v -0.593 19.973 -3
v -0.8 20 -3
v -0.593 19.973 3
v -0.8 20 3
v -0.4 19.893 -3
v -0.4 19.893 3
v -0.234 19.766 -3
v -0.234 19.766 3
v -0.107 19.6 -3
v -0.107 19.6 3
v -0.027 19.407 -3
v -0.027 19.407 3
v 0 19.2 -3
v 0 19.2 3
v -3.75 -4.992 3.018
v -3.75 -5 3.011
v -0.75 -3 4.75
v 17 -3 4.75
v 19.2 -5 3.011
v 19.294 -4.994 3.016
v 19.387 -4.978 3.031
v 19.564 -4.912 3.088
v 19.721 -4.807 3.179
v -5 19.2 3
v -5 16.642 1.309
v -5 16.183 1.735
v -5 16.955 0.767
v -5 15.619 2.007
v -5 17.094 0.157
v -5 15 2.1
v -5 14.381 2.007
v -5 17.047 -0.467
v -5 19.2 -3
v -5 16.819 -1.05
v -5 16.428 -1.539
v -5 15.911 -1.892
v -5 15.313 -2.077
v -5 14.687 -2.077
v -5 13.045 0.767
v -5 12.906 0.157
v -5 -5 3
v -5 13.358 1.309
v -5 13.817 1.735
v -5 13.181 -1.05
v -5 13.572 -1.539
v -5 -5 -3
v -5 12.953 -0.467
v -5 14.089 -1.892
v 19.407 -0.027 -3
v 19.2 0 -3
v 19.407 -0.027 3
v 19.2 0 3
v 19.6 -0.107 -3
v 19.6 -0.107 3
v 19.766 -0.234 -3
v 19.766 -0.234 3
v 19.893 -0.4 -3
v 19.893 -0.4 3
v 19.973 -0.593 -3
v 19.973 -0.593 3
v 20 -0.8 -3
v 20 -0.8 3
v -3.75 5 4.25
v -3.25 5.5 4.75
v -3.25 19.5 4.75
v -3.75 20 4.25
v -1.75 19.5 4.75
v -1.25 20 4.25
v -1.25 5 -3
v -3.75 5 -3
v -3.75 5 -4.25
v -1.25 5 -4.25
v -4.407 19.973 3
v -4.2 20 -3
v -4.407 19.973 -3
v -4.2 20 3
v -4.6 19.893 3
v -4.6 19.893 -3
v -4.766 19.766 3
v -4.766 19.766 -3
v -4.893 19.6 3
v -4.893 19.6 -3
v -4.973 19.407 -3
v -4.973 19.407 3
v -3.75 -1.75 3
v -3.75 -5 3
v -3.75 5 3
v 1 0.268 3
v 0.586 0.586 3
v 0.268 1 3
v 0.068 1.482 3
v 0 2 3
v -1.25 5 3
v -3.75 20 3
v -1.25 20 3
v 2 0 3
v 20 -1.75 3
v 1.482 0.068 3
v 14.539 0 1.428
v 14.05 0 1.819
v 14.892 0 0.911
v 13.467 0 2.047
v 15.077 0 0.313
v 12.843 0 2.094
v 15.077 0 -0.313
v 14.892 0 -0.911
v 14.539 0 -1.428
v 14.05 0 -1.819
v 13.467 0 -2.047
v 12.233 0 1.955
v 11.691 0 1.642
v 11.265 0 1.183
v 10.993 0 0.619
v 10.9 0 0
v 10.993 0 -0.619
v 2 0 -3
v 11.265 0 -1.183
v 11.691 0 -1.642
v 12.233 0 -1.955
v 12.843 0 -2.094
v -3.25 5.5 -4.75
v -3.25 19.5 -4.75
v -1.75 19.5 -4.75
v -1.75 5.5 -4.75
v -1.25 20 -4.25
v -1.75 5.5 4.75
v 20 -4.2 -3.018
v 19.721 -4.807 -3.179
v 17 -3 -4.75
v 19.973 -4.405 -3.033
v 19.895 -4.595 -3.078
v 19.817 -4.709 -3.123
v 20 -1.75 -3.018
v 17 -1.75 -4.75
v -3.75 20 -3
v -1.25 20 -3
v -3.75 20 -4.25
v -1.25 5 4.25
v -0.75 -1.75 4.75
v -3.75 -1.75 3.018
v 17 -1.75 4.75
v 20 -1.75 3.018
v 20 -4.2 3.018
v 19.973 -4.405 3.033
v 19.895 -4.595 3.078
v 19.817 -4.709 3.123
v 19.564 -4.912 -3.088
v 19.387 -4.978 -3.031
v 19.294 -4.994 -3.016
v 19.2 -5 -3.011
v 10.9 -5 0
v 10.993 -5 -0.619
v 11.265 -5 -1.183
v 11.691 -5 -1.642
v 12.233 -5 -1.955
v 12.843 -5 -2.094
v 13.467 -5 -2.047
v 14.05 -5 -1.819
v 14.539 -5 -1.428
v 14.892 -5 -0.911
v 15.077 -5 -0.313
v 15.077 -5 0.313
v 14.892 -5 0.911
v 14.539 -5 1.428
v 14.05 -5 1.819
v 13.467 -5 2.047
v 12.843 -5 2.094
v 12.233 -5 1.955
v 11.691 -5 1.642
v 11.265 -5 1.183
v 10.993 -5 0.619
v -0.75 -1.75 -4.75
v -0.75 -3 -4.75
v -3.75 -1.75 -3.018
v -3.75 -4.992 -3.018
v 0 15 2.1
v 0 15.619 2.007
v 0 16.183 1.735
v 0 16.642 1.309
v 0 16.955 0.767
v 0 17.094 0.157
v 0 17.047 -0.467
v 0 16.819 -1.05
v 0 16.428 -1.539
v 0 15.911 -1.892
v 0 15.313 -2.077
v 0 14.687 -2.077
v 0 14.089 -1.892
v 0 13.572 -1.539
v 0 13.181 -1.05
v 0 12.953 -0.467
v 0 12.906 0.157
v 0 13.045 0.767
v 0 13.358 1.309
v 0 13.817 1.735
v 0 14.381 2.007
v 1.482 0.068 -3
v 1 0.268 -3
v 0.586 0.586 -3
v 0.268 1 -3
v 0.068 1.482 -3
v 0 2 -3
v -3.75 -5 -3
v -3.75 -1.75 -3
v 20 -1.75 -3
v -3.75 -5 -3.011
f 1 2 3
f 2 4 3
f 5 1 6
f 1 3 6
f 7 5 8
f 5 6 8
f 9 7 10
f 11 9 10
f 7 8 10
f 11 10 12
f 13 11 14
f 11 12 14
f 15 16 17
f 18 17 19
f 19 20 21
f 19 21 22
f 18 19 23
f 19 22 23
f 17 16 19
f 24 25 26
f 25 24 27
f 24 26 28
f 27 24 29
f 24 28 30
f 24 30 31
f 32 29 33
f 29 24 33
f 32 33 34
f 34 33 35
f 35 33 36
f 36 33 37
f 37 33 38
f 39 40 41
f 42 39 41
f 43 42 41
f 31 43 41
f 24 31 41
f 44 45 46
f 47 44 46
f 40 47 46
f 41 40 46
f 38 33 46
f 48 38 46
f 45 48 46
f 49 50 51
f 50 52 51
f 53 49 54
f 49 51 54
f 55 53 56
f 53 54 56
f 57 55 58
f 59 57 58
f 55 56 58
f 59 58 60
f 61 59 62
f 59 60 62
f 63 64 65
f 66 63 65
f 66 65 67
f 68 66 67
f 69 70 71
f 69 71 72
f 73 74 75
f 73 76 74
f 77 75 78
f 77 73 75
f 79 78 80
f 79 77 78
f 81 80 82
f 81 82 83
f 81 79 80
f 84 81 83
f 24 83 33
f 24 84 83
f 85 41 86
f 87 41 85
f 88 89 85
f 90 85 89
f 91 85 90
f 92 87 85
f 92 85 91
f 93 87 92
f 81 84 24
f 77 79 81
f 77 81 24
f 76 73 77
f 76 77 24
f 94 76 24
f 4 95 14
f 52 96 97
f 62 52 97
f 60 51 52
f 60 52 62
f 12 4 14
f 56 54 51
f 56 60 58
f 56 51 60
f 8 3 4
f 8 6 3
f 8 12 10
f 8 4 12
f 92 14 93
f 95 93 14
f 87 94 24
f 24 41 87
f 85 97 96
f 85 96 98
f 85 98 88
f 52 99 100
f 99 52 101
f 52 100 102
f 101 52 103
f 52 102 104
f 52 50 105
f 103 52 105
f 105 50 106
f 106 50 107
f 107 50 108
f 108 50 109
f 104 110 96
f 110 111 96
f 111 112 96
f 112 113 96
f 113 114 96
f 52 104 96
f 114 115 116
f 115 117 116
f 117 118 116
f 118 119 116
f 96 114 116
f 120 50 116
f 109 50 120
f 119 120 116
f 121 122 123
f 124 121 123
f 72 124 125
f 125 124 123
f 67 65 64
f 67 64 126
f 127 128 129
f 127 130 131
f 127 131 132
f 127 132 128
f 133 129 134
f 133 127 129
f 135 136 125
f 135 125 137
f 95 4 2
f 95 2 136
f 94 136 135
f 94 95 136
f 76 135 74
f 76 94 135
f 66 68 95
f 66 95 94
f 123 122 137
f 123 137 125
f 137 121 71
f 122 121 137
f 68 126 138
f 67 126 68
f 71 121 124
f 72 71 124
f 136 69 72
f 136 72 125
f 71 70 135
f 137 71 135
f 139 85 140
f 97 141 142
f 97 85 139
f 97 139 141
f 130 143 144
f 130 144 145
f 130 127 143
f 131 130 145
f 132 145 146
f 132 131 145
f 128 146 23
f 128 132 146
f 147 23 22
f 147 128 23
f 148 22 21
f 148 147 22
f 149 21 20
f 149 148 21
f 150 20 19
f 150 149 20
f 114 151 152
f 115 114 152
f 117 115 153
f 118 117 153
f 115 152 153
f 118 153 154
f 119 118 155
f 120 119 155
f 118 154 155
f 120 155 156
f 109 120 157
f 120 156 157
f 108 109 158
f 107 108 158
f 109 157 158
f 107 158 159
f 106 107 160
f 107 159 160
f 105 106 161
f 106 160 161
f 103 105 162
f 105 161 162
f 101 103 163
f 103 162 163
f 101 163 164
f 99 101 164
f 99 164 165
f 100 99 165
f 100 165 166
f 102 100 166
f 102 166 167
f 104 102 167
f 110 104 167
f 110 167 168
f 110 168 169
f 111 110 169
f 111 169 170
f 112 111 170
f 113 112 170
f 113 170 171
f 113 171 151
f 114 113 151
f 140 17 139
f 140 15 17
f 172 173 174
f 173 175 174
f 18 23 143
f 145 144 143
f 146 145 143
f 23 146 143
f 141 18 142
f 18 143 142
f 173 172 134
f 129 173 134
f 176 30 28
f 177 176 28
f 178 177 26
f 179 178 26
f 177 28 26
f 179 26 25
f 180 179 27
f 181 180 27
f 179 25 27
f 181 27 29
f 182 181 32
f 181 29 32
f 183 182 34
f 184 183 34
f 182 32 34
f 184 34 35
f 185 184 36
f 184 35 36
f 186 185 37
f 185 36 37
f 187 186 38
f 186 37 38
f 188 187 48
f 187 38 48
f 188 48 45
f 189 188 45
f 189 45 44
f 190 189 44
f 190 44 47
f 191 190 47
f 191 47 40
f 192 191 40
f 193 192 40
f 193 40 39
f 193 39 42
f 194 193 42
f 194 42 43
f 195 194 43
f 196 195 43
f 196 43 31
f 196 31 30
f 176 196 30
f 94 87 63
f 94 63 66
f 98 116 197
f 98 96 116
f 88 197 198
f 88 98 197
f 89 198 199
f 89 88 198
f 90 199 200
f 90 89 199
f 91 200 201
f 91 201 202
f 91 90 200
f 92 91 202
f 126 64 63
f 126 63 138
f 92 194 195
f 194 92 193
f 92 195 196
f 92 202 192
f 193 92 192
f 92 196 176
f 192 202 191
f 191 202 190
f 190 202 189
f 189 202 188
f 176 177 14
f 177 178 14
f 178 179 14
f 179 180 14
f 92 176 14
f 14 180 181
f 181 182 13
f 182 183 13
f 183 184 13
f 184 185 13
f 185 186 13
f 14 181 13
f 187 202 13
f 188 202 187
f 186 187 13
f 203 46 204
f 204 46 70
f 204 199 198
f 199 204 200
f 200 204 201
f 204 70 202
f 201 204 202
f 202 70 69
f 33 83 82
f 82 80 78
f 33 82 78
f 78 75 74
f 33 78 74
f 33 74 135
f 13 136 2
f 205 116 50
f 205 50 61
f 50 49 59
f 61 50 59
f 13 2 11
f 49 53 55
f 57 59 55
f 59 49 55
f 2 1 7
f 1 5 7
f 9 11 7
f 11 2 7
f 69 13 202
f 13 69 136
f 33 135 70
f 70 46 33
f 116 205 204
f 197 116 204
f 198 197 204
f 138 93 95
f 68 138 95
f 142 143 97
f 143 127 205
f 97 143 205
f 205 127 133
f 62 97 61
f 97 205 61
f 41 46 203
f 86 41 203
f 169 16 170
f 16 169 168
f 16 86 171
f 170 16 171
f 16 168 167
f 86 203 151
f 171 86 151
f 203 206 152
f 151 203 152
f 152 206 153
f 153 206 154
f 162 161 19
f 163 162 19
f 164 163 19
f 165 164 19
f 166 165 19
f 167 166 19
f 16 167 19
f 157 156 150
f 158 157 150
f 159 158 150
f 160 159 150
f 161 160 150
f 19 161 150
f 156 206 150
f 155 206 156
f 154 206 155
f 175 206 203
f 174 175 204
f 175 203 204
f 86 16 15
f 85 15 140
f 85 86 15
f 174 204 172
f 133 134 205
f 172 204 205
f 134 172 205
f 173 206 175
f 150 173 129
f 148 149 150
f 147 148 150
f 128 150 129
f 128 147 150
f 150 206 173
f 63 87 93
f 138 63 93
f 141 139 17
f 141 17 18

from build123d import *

# Parameters (mm, degrees)
EXTRUDE1_DEPTH        = 3
EXTRUDE1_DEPTH_BACK   = 3
SKETCH2_W             = 2.5
SKETCH2_H             = 15
SKETCH2_W_2           = 23.75
SKETCH2_H_2           = 3.25
EXTRUDE2_DEPTH        = 1.75
CHAMFER1_SIZE         = 3
CHAMFER1_SIZE2        = 1.732050808
CHAMFER2_SIZE         = 2
CHAMFER2_SIZE2        = 1.738573476
CHAMFER3_SIZE         = 0.5
FILLET1_R             = 0.8
FILETE1_R             = 2
FURO_ROSCADO_DE_M51_D = 4.2
FURO_ROSCADO_DE_M52_D = 4.2


# Read off the part's stored shape, not the designer's step: Mirror1
with BuildPart() as part:
    # Sketch1 → Extrude1 (new, two sides: drawn at the far end of the back side and taken through both)
    with BuildSketch(Plane.XY.offset(-EXTRUDE1_DEPTH_BACK)):
        Polygon((0, 0), (0, 20), (-5, 20), (-5, -5), (20, -5), (20, 0), align=None)
    extrude(amount=EXTRUDE1_DEPTH + EXTRUDE1_DEPTH_BACK)

    # Sketch2 → Extrude2 (add)
    with BuildSketch(Plane.XY.offset(3)):
        with Locations((-2.5, 12.5)):
            Rectangle(SKETCH2_W, SKETCH2_H)
        with Locations((8.125, -3.375)):
            Rectangle(SKETCH2_W_2, SKETCH2_H_2)
    extrude(amount=EXTRUDE2_DEPTH)

    # Chamfer1
    chamfer1_edges = [part.edges().sort_by_distance(p)[0] for p in [
        (20, -3.375, 4.75),
        (-3.75, -3.375, 4.75),
    ]]
    chamfer1_side = [part.faces().sort_by_distance(p)[0] for p in [
        (8.125, -3.375, 4.75),
    ]]
    chamfer(chamfer1_edges, length=CHAMFER1_SIZE, length2=CHAMFER1_SIZE2, reference=chamfer1_side[0])

    # Chamfer2
    chamfer2_edges = [part.edges().sort_by_distance(p)[0] for p in [
        (8.125, -5, 4.75),
    ]]
    chamfer2_side = [part.faces().sort_by_distance(p)[0] for p in [
        (8.125, -3.375, 4.75),
    ]]
    chamfer(chamfer2_edges, length=CHAMFER2_SIZE, length2=CHAMFER2_SIZE2, reference=chamfer2_side[0])

    # Chamfer3
    chamfer3_edges = [part.edges().sort_by_distance(p)[0] for p in [
        (-2.5, 20, 4.75),
        (-1.25, 12.5, 4.75),
        (-2.5, 5, 4.75),
        (-3.75, 12.5, 4.75),
    ]]
    chamfer(chamfer3_edges, length=CHAMFER3_SIZE)

    # Mirror1: part across plane


with BuildPart() as part_1:
    add(part.part)
    add(part.part.mirror(Plane.XY))

    # Fillet1
    fillet1_edges = [part_1.edges().sort_by_distance(p)[0] for p in [
        (-5, 20, 0),
        (20, -5, 0),
        (20, 0, 0),
        (0, 20, 0),
    ]]
    fillet(fillet1_edges, radius=FILLET1_R)

    # Filete1
    filete1_edges = [part_1.edges().sort_by_distance(p)[0] for p in [
        (0, 0, 0),
    ]]
    fillet(filete1_edges, radius=FILETE1_R)

    # Furo roscado de M51 (through all)
    with Locations(Plane(origin=(0, 0, 0), x_dir=(1, 0, 0), z_dir=(0, 1, 0))):
        with Locations((13, 0)):
            Hole(FURO_ROSCADO_DE_M51_D / 2)

    # Furo roscado de M52 (through all)
    with Locations(Plane(origin=(0, 0, 0), x_dir=(0, 0, -1), z_dir=(1, 0, 0))):
        with Locations((0, 15)):
            Hole(FURO_ROSCADO_DE_M52_D / 2)


solid = part_1.part
